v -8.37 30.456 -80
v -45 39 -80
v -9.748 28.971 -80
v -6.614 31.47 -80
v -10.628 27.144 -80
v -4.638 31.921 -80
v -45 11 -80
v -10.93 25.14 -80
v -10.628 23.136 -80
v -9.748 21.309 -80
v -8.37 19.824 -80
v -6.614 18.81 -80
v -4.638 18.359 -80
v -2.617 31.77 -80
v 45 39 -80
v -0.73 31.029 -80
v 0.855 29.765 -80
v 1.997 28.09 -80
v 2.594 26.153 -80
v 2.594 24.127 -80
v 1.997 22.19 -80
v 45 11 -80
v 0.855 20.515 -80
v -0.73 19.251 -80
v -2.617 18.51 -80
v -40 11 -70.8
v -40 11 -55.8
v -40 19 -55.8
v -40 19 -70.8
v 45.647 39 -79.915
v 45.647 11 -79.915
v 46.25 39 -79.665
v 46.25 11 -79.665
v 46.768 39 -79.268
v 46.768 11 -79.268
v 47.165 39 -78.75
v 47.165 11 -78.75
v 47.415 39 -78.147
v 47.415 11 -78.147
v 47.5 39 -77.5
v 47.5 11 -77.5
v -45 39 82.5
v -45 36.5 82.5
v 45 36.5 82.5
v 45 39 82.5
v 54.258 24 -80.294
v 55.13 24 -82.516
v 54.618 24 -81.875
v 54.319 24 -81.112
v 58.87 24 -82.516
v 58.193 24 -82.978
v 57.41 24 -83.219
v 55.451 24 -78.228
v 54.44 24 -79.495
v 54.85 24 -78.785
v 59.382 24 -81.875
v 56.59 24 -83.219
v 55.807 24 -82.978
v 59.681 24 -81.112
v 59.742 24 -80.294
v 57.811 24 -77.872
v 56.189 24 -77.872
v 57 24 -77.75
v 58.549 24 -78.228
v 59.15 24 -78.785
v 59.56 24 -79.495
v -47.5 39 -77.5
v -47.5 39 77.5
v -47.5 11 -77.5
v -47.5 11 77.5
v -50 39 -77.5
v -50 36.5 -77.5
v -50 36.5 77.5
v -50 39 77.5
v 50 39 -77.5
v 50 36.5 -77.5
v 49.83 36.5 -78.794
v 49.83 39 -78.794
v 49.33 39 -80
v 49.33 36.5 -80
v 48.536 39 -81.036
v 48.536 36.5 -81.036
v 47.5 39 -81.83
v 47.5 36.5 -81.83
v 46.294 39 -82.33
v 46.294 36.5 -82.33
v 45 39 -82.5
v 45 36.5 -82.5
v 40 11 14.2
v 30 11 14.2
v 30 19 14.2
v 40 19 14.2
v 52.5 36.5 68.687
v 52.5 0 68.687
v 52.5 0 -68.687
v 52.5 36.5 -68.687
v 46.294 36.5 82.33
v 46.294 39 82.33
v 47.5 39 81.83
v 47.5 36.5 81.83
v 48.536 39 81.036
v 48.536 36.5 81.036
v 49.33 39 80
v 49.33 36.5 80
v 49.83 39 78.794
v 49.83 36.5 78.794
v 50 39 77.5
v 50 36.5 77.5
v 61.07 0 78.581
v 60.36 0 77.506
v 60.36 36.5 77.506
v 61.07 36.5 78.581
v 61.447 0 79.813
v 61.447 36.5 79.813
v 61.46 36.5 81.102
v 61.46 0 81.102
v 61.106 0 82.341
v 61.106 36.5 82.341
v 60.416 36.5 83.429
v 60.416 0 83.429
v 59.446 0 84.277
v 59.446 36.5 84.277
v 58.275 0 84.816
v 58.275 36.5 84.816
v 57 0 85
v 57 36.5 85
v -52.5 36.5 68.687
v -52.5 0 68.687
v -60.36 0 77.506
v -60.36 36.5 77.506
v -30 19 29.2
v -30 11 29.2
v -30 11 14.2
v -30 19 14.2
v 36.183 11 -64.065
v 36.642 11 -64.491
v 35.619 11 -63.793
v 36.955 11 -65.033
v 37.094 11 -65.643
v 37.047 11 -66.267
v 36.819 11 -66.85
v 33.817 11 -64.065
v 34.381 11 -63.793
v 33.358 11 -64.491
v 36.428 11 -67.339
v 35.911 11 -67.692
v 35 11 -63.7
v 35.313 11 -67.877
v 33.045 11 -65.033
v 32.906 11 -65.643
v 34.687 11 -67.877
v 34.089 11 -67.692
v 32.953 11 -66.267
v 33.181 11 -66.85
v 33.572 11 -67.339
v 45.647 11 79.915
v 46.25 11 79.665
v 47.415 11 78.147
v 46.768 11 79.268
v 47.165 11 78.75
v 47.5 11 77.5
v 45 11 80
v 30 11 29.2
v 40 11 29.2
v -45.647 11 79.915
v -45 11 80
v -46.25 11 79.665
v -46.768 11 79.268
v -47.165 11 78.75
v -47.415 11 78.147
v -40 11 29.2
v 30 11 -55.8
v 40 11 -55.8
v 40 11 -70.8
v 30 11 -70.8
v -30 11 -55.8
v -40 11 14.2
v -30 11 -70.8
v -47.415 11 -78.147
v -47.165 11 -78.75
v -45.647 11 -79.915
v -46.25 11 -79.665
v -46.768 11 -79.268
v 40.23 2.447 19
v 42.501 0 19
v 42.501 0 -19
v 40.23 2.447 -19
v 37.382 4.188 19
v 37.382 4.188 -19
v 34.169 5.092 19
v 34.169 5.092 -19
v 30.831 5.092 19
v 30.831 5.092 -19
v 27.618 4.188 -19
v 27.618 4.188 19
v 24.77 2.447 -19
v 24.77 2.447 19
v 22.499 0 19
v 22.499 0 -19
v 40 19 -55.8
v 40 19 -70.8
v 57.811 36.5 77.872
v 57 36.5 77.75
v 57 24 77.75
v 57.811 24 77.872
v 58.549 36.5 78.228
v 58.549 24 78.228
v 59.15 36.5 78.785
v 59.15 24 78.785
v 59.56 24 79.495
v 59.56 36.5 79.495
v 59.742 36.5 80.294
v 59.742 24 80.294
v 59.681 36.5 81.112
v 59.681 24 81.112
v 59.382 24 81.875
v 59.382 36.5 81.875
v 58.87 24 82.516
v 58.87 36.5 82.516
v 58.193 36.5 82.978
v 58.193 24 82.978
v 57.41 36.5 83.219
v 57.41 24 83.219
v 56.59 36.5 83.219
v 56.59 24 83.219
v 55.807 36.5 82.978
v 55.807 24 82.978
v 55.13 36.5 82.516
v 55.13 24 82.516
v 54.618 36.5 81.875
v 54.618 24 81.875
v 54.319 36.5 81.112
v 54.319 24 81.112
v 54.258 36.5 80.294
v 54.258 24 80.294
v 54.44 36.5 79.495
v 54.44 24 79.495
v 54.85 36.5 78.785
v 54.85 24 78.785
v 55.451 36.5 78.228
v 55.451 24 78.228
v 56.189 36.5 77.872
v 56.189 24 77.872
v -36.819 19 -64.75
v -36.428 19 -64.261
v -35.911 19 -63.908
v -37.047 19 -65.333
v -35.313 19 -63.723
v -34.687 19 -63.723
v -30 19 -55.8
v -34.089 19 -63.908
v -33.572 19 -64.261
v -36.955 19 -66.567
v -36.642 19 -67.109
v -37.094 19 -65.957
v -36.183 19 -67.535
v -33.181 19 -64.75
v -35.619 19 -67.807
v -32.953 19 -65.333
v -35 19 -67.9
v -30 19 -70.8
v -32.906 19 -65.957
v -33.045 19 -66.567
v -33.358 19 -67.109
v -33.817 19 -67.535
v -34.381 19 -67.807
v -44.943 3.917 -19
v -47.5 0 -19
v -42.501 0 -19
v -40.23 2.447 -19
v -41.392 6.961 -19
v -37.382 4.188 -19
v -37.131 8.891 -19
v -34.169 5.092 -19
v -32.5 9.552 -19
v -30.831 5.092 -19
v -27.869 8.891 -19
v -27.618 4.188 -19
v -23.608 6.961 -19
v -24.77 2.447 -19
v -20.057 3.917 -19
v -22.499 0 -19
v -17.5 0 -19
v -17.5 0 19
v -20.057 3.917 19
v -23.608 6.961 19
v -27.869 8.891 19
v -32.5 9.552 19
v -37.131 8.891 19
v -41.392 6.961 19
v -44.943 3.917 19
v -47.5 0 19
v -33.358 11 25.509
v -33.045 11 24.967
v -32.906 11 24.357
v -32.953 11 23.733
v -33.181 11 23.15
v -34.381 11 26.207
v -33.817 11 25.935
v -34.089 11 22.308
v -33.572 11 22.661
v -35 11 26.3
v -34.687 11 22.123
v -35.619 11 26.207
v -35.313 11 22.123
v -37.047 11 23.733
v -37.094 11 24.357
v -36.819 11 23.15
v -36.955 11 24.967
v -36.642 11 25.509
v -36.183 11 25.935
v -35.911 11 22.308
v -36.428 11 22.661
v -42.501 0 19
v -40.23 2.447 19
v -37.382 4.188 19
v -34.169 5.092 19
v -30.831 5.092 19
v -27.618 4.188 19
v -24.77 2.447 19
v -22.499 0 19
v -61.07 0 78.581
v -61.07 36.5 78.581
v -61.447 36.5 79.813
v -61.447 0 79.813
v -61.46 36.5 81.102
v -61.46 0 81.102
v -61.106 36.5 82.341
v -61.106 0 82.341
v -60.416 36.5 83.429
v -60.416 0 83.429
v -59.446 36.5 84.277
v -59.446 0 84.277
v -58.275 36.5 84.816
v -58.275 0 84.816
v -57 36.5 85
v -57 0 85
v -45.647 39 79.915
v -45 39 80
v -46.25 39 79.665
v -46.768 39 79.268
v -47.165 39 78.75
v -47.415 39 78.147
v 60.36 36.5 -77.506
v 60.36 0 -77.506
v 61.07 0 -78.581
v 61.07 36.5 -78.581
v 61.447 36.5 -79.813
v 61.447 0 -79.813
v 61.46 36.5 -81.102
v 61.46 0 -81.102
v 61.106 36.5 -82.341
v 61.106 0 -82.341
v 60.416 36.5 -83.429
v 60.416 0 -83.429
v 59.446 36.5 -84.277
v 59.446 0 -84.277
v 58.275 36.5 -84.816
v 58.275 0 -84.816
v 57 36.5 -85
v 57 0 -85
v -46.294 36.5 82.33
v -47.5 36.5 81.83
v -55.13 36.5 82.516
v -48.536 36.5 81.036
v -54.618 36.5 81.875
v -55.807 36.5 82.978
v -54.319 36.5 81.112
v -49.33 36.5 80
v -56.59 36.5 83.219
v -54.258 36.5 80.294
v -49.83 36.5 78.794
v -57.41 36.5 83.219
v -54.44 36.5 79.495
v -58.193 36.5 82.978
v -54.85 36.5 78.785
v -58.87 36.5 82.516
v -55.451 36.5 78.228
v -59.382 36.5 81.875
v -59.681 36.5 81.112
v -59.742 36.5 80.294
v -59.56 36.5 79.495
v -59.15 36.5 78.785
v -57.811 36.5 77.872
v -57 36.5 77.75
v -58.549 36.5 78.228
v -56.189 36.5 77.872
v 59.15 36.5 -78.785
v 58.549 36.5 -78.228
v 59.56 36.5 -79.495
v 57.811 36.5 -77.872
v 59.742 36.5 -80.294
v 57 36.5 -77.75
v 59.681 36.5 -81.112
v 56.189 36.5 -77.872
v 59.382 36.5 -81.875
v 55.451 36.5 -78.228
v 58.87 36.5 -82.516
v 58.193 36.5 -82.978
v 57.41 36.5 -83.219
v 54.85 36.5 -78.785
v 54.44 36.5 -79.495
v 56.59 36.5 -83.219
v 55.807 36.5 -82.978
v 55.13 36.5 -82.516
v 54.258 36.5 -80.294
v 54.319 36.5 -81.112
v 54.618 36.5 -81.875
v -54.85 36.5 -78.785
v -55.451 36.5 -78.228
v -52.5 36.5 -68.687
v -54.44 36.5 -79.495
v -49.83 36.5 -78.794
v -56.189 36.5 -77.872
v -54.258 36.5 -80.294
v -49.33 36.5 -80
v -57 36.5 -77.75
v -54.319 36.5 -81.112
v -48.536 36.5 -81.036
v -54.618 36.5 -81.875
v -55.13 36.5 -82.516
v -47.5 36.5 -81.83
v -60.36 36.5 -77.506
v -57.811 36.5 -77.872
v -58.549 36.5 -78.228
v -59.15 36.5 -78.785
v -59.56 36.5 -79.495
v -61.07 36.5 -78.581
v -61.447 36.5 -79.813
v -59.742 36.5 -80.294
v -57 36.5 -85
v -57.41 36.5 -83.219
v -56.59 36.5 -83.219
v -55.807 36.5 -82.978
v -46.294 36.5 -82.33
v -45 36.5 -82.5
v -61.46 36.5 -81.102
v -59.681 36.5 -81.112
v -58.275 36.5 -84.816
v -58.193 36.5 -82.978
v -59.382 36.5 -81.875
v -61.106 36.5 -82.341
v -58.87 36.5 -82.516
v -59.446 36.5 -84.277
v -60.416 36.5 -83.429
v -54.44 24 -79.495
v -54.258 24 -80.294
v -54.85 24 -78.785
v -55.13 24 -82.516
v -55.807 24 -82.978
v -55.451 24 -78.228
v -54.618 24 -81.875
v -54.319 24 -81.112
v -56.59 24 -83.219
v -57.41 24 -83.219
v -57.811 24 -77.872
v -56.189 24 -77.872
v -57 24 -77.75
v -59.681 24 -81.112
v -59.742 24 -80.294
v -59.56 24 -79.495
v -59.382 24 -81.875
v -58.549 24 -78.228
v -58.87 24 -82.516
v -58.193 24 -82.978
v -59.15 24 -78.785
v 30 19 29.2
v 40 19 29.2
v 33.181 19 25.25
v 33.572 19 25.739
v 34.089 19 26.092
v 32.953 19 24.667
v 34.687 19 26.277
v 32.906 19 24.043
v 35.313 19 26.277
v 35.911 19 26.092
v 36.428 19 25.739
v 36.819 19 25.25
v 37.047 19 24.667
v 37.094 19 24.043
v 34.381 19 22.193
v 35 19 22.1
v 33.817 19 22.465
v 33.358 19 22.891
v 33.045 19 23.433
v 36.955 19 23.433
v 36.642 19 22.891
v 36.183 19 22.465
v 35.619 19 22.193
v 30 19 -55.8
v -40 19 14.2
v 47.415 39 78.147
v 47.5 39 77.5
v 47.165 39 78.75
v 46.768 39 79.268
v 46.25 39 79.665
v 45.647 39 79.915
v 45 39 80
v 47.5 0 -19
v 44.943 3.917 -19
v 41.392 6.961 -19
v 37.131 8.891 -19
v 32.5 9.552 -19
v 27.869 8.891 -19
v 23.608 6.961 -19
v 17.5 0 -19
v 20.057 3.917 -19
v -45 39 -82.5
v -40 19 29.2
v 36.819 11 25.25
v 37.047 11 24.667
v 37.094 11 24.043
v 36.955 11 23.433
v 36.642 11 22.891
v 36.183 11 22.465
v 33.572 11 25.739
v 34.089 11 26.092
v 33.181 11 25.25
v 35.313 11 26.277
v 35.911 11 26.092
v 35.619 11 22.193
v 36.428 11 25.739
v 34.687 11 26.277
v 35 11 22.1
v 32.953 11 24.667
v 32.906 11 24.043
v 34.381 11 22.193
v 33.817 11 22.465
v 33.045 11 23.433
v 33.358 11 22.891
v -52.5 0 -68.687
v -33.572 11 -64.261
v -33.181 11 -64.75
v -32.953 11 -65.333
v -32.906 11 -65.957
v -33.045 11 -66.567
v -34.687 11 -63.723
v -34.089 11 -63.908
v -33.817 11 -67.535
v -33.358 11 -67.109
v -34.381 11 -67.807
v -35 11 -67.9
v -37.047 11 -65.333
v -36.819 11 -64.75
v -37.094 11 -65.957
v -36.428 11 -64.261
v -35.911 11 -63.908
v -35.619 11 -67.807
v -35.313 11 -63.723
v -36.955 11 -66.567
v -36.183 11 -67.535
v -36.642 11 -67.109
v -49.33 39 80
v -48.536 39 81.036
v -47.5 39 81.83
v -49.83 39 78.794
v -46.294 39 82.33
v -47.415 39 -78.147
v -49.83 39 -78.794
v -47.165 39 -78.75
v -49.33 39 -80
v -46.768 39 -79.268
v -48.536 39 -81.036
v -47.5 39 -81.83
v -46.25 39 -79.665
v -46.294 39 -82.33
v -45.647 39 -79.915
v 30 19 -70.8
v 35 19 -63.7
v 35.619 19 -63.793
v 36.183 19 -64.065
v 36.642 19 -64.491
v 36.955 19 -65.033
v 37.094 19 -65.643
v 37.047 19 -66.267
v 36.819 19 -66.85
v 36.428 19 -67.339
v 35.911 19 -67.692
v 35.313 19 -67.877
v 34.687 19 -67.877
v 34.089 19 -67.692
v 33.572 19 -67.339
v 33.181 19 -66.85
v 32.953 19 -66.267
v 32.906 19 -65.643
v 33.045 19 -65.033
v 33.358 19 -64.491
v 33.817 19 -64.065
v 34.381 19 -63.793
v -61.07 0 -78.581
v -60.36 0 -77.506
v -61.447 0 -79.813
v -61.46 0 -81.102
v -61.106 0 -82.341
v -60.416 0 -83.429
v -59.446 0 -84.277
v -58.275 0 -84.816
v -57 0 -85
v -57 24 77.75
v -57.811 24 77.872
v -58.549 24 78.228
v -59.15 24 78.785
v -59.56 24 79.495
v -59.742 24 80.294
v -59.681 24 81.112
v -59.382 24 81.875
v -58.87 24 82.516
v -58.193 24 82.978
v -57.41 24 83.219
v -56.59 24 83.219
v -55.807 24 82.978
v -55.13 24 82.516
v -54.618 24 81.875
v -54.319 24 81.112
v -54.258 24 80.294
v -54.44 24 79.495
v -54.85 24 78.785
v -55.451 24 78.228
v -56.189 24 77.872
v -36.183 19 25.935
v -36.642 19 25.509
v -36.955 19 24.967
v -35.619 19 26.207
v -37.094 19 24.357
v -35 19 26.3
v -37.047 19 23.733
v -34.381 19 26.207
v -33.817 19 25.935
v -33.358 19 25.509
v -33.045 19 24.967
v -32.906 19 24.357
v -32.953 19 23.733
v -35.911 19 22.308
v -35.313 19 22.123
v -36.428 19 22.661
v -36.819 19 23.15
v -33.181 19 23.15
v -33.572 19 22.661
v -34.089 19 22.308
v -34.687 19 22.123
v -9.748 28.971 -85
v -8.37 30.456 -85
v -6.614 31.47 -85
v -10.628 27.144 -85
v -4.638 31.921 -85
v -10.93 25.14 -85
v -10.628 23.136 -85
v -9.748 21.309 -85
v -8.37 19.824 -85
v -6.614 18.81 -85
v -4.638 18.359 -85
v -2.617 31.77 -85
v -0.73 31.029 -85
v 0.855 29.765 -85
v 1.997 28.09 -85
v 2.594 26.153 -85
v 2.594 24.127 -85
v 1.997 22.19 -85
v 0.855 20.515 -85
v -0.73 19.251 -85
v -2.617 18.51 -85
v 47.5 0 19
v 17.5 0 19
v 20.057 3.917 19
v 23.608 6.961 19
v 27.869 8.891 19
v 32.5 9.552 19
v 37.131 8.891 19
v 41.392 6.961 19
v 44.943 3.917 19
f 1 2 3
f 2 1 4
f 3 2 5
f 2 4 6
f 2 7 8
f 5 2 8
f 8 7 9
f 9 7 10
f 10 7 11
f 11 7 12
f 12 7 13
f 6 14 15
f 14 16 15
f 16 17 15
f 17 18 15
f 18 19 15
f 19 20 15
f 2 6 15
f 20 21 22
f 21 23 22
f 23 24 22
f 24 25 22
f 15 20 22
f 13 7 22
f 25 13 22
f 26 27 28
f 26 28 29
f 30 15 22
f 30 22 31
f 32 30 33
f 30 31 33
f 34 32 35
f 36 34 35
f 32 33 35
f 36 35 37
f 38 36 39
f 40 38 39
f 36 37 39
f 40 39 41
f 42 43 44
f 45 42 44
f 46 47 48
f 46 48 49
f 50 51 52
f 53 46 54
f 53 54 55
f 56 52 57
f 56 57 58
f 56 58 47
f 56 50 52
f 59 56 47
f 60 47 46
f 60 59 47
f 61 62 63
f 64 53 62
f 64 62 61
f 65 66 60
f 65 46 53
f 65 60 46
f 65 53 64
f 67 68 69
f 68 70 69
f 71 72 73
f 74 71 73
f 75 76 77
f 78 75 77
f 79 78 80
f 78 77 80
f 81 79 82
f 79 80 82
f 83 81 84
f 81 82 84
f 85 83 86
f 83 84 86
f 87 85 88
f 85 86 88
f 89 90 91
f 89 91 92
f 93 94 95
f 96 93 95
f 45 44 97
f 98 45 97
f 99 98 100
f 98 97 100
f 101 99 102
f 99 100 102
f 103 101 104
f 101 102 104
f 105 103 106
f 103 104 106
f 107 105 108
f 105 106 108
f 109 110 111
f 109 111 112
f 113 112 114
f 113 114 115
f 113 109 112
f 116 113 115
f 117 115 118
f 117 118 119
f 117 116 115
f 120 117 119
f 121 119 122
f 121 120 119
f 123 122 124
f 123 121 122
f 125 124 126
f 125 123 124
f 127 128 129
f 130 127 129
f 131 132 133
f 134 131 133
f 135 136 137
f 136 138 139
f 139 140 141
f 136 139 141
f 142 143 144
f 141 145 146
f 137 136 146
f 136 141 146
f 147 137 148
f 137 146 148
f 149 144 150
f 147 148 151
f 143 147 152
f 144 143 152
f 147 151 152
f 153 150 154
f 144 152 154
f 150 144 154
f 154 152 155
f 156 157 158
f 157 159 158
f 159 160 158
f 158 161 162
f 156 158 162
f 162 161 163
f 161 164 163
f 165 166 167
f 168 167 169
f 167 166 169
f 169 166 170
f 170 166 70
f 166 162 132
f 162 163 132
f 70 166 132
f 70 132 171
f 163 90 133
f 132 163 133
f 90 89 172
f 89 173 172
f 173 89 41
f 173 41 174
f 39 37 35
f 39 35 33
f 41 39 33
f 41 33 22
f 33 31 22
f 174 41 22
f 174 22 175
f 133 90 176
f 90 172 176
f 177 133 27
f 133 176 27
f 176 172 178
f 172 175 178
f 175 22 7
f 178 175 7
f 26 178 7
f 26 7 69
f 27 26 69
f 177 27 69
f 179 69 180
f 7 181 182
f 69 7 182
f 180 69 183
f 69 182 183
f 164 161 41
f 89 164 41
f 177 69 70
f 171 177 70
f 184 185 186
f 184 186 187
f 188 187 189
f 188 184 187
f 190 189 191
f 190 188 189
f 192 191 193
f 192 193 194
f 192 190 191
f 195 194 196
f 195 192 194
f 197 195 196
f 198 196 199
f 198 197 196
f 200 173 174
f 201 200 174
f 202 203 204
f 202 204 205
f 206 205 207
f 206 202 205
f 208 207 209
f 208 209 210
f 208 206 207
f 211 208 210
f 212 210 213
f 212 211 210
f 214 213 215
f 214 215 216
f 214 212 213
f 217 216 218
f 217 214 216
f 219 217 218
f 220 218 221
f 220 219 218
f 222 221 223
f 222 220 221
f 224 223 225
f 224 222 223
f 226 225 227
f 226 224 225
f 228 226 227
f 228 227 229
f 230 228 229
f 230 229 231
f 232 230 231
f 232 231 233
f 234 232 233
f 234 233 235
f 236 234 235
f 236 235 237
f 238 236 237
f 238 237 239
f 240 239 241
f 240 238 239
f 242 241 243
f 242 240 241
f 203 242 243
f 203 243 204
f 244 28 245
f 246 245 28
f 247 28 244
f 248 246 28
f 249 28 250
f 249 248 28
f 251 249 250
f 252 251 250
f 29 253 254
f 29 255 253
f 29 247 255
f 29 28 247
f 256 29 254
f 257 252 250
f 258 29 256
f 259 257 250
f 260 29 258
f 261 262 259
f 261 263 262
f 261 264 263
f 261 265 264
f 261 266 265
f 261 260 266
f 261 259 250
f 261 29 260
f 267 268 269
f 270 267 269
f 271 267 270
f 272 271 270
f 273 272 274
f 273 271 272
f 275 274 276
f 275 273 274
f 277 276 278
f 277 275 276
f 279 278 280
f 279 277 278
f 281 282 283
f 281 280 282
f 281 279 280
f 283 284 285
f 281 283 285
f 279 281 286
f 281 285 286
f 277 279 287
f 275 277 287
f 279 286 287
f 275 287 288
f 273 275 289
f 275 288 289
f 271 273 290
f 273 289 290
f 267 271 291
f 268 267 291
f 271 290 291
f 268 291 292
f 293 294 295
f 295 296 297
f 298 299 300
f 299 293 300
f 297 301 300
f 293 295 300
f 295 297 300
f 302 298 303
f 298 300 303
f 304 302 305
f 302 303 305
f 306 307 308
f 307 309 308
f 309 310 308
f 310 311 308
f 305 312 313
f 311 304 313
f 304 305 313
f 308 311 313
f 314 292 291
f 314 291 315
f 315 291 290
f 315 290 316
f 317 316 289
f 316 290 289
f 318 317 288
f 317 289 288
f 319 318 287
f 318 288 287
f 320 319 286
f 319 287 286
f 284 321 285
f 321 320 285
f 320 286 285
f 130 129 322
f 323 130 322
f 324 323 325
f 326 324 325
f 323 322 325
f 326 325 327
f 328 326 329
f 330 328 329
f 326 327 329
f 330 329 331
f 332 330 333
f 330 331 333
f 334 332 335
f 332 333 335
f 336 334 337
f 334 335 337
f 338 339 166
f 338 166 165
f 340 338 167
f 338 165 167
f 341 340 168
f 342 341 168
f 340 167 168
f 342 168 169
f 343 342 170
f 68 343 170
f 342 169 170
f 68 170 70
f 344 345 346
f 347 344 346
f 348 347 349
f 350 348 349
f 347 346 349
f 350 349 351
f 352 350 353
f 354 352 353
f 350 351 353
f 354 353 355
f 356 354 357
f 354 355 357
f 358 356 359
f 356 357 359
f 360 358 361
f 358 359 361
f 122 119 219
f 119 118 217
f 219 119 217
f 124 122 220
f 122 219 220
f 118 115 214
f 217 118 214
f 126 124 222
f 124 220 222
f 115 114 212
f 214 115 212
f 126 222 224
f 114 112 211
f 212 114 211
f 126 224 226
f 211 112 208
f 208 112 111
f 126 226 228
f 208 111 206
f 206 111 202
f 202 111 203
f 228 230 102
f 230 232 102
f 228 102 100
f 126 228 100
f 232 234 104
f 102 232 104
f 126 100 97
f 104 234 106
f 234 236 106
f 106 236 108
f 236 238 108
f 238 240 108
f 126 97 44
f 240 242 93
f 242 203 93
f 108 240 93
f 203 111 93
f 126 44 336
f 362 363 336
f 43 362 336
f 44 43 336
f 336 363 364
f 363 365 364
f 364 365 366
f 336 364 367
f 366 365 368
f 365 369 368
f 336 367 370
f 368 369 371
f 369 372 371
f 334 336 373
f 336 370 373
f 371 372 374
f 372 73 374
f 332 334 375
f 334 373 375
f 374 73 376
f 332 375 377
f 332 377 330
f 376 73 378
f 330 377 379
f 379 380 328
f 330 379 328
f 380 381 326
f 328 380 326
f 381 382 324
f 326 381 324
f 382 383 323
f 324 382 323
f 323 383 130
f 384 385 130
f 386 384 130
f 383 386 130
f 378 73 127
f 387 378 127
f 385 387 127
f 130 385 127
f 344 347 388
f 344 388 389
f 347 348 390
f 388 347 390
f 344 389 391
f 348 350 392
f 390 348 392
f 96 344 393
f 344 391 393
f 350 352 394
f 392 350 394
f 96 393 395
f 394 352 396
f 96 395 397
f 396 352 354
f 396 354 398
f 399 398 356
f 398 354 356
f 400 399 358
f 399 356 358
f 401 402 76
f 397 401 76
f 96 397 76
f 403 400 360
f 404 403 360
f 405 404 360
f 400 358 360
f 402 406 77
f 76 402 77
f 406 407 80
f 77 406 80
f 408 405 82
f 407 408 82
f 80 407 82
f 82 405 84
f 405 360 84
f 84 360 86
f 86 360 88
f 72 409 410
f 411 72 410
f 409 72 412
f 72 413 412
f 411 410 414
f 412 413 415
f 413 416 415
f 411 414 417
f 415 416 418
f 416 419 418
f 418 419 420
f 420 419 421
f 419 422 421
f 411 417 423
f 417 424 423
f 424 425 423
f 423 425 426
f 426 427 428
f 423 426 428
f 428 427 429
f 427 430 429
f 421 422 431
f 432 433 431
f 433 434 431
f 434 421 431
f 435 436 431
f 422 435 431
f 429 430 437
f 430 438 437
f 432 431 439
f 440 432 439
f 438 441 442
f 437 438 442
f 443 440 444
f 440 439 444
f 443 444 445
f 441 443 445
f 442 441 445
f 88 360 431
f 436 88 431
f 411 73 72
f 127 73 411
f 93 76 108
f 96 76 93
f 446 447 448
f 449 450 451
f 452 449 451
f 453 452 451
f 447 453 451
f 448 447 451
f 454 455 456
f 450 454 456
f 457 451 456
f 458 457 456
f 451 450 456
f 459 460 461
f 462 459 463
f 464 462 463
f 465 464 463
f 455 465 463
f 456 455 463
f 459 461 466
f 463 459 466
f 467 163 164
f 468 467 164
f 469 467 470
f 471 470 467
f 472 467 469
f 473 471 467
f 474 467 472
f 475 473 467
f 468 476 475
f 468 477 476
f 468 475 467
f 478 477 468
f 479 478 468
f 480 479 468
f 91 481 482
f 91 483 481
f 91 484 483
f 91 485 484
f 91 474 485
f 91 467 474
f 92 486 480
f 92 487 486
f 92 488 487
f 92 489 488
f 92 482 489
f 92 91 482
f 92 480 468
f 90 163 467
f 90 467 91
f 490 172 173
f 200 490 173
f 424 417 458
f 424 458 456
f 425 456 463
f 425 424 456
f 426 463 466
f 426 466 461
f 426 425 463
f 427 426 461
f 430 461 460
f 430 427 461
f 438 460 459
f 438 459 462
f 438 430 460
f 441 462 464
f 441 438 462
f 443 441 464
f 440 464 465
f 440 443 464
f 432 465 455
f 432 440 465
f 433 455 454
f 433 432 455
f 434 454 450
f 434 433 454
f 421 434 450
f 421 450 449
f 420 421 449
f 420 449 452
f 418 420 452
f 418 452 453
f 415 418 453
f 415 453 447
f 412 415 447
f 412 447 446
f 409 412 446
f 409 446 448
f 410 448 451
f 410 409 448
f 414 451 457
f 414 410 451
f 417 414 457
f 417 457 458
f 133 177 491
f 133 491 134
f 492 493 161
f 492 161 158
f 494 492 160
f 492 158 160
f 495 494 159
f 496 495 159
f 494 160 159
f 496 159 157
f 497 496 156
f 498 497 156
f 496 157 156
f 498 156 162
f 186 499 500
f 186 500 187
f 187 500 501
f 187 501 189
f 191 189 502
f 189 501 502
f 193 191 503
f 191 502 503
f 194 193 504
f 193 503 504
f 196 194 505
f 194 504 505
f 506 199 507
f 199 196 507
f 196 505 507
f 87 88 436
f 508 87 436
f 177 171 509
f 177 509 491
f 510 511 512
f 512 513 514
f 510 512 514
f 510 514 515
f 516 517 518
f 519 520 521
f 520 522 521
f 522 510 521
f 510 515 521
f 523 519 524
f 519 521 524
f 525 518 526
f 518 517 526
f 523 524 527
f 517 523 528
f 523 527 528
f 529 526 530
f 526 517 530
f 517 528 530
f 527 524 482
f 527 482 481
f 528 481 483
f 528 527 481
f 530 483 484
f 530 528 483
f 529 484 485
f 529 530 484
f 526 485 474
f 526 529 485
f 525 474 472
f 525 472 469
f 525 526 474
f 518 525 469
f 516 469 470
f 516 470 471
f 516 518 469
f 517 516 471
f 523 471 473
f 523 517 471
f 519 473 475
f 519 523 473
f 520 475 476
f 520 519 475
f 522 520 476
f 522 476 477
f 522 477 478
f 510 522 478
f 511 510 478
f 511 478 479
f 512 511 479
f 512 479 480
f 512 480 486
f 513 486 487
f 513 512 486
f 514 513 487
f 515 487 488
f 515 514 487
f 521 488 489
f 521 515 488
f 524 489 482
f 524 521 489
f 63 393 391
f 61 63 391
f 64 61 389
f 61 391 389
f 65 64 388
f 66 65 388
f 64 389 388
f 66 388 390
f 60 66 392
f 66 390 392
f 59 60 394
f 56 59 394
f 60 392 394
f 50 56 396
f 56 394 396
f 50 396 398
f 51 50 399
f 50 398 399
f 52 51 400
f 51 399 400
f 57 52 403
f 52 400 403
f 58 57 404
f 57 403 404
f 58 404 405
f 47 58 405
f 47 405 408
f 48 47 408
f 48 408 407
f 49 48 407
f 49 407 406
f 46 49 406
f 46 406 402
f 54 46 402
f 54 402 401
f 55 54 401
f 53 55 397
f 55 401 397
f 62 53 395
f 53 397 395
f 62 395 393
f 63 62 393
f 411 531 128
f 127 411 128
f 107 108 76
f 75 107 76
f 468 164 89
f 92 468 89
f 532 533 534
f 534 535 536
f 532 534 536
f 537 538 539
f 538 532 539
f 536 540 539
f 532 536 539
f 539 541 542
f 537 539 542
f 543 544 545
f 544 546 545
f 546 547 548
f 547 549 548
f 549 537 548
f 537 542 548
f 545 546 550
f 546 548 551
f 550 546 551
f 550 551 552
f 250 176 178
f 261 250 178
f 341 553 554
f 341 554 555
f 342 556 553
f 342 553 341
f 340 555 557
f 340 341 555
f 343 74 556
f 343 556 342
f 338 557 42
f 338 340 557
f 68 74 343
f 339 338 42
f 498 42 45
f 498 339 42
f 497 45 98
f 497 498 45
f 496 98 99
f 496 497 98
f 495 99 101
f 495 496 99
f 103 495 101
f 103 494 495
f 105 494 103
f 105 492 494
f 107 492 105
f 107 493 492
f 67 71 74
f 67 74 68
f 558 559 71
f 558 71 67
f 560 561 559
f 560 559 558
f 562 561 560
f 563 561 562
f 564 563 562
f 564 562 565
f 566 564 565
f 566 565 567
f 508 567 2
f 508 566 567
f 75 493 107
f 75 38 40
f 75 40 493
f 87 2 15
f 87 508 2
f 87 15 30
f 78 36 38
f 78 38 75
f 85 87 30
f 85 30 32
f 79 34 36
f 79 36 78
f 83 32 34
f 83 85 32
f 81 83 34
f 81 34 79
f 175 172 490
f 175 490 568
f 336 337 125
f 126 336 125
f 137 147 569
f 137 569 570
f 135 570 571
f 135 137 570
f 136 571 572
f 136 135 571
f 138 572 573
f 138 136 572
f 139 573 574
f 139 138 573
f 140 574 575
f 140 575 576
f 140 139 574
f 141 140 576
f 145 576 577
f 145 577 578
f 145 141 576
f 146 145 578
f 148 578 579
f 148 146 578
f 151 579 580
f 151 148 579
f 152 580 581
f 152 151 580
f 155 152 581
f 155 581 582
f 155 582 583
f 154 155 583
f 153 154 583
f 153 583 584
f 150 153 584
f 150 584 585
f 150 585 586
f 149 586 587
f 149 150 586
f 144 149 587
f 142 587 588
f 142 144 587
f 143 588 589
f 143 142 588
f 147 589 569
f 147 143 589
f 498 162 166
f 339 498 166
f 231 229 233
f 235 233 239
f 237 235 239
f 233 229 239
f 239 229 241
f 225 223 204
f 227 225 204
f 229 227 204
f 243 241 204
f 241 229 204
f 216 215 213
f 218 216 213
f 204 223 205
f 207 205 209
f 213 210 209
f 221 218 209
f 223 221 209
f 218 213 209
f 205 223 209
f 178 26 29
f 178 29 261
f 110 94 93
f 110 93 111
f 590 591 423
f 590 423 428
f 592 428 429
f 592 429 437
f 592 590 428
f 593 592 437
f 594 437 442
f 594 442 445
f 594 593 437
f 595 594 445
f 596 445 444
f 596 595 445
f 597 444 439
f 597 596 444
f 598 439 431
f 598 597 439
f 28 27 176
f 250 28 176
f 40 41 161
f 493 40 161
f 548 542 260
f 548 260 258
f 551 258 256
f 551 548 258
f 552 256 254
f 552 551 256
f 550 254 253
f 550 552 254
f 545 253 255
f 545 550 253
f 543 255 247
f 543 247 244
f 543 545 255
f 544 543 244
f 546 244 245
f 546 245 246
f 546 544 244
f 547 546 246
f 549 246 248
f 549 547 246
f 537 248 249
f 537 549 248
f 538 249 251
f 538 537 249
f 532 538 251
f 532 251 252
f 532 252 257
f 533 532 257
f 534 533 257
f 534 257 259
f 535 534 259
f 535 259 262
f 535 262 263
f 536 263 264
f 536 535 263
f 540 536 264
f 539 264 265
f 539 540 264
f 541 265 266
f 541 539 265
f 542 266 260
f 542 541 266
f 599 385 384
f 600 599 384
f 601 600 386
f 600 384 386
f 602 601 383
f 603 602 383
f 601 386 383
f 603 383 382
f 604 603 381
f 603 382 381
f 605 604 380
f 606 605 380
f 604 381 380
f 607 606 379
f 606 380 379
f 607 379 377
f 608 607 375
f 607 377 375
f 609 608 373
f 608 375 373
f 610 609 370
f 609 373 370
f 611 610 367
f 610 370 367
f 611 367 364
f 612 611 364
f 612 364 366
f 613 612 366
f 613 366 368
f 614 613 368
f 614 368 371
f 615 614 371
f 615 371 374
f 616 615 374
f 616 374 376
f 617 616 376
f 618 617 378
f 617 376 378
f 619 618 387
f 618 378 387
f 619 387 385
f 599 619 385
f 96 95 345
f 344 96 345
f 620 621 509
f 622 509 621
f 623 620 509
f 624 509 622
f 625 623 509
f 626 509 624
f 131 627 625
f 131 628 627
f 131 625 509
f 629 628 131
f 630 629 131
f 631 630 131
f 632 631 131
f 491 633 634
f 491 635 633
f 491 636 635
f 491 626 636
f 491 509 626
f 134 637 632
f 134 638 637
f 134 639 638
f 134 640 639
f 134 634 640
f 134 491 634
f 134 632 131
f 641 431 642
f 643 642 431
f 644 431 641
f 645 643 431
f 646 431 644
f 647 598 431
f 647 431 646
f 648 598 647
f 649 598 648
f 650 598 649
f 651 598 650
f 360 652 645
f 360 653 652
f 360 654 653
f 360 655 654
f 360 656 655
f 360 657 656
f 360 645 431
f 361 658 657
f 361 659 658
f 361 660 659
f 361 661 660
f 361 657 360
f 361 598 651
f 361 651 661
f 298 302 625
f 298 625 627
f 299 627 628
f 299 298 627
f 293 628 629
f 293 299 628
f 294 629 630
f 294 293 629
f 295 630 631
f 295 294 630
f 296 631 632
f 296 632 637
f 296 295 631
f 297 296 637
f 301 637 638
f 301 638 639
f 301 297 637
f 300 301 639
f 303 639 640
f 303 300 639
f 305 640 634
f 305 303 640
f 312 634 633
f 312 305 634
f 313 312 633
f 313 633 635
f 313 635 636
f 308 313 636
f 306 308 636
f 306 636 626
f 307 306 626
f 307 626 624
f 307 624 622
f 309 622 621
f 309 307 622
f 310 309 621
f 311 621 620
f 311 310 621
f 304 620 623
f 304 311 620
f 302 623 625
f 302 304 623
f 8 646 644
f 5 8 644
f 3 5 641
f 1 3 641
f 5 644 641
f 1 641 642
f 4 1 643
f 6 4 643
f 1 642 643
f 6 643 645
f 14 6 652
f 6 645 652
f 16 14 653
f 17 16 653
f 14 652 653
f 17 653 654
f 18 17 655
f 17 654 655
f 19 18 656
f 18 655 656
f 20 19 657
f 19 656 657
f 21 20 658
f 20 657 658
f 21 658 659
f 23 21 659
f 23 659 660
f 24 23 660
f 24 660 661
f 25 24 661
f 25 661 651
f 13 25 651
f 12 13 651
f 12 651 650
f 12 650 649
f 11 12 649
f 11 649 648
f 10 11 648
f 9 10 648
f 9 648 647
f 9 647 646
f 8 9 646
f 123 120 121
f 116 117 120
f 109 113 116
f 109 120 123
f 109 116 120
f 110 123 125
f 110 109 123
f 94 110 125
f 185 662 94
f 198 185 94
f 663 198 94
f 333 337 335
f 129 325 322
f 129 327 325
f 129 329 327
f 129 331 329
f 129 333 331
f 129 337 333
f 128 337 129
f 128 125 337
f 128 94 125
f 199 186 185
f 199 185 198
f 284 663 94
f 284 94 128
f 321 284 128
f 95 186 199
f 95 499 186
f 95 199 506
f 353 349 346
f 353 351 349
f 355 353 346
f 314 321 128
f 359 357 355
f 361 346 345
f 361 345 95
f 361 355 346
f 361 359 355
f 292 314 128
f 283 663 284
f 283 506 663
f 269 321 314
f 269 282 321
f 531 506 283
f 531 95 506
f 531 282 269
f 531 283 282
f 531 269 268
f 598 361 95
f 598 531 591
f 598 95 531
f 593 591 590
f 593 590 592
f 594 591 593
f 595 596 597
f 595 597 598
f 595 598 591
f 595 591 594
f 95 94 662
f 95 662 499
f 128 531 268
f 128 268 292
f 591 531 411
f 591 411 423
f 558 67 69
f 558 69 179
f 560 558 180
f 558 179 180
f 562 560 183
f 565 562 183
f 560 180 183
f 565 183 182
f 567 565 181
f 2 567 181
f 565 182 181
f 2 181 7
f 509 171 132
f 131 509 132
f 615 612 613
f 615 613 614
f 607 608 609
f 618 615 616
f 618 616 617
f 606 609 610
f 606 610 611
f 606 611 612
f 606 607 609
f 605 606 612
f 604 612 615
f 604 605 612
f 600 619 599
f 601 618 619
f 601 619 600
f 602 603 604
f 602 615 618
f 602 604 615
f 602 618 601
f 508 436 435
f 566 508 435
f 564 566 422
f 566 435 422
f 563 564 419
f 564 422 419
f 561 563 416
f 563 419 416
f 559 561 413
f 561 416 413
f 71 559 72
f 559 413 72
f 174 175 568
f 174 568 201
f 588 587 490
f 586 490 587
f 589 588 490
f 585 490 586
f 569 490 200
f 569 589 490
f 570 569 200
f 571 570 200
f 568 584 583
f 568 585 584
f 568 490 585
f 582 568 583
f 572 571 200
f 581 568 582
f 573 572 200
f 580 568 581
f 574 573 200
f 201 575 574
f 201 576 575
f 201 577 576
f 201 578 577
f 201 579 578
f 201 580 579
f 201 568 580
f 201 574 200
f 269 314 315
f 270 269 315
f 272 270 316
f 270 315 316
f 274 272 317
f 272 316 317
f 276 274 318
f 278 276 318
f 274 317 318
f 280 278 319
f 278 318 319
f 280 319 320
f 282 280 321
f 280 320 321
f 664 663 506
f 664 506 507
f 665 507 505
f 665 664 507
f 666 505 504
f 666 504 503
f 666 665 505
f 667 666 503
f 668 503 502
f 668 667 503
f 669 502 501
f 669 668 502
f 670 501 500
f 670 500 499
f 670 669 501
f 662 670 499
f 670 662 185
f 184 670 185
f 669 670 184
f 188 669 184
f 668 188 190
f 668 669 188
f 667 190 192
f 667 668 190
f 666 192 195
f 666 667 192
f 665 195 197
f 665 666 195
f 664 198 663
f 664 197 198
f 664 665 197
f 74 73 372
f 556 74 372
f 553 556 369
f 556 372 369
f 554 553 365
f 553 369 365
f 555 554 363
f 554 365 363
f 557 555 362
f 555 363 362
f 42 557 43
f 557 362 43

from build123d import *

# Parameters (mm, degrees)
SALIENTE_EXTRUIR2_DEPTH   = 11
SALIENTE_EXTRUIR3_DEPTH   = 25.5
SALIENTE_EXTRUIR4_DEPTH   = 2.5
SALIENTE_EXTRUIR5_DEPTH   = 36.5
SIMETR_A2_COPY_1_DEPTH    = 36.5
CROQUIS6_W                = 10
CROQUIS6_H                = 15
CROQUIS6_R                = 2.1
SALIENTE_EXTRUIR6_DEPTH   = 8
CROQUIS8_R                = 6.8
CORTAR_EXTRUIR2_DEPTH     = 8
CROQUIS9_R                = 6.5
CORTAR_EXTRUIR3_DEPTH     = 8
CORTAR_EXTRUIR4_DEPTH     = 38
CROQUIS13_R               = 2.75
CORTAR_EXTRUIR5_DEPTH     = 12.5
SIMETR_A7_COPY_1_SKETCH_R = 2.75
SIMETR_A7_COPY_1_DEPTH    = 12.5
CORTAR_EXTRUIR6_START     = -2.5
CROQUIS15_R               = 12.5
CROQUIS15_R_2             = 6.5
CORTAR_EXTRUIR6_DEPTH     = 2.5
CROQUIS16_R               = 13.413268366
SALIENTE_EXTRUIR7_DEPTH   = 5


with BuildPart() as part:
    # Croquis1 → Saliente-Extruir2 (new body)
    # profile 1 of 3: a face of its own
    with BuildSketch(Plane(origin=(0, 0, 0), x_dir=(1, 0, 0), z_dir=(0, 1, 0))):
        with BuildLine():
            Line((-45, 85), (45, 85))
            ThreePointArc((45, 85), (50.303300859, 82.803300859), (52.5, 77.5))
            Line((52.5, 77.5), (52.5, -77.5))
            ThreePointArc((52.5, -77.5), (50.303300859, -82.803300859), (45, -85))
            Line((45, -85), (-45, -85))
            ThreePointArc((-45, -85), (-50.303300859, -82.803300859), (-52.5, -77.5))
            Line((-52.5, -77.5), (-52.5, 77.5))
            ThreePointArc((-52.5, 77.5), (-50.303300859, 82.803300859), (-45, 85))
        make_face()
        with BuildLine():
            ThreePointArc((-45, 82.5), (-48.535533906, 81.035533906), (-50, 77.5))
            Line((-50, 77.5), (-50, -77.5))
            ThreePointArc((-50, -77.5), (-48.535533906, -81.035533906), (-45, -82.5))
            Line((-45, -82.5), (45, -82.5))
            ThreePointArc((45, -82.5), (48.535533906, -81.035533906), (50, -77.5))
            Line((50, -77.5), (50, 77.5))
            ThreePointArc((50, 77.5), (48.535533906, 81.035533906), (45, 82.5))
            Line((45, 82.5), (-45, 82.5))
        make_face(mode=Mode.SUBTRACT)
    # profile 2 of 3: a face of its own
    with BuildSketch(Plane(origin=(0, 0, 0), x_dir=(1, 0, 0), z_dir=(0, 1, 0))):
        with BuildLine():
            Line((-45, 82.5), (45, 82.5))
            ThreePointArc((45, 82.5), (48.535533906, 81.035533906), (50, 77.5))
            Line((50, 77.5), (50, -77.5))
            ThreePointArc((50, -77.5), (48.535533906, -81.035533906), (45, -82.5))
            Line((45, -82.5), (-45, -82.5))
            ThreePointArc((-45, -82.5), (-48.535533906, -81.035533906), (-50, -77.5))
            Line((-50, -77.5), (-50, 77.5))
            ThreePointArc((-50, 77.5), (-48.535533906, 81.035533906), (-45, 82.5))
        make_face()
        with BuildLine():
            ThreePointArc((45, -80), (46.767766953, -79.267766953), (47.5, -77.5))
            Line((47.5, -77.5), (47.5, 77.5))
            ThreePointArc((47.5, 77.5), (46.767766953, 79.267766953), (45, 80))
            Line((45, 80), (-45, 80))
            ThreePointArc((-45, 80), (-46.767766953, 79.267766953), (-47.5, 77.5))
            Line((-47.5, 77.5), (-47.5, -77.5))
            ThreePointArc((-47.5, -77.5), (-46.767766953, -79.267766953), (-45, -80))
            Line((-45, -80), (45, -80))
        make_face(mode=Mode.SUBTRACT)
    # profile 3 of 3: a face of its own
    with BuildSketch(Plane(origin=(0, 0, 0), x_dir=(1, 0, 0), z_dir=(0, 1, 0))):
        with BuildLine():
            Line((-45, -80), (45, -80))
            ThreePointArc((45, -80), (46.767766953, -79.267766953), (47.5, -77.5))
            Line((47.5, -77.5), (47.5, 77.5))
            ThreePointArc((47.5, 77.5), (46.767766953, 79.267766953), (45, 80))
            Line((45, 80), (-45, 80))
            ThreePointArc((-45, 80), (-46.767766953, 79.267766953), (-47.5, 77.5))
            Line((-47.5, 77.5), (-47.5, -77.5))
            ThreePointArc((-47.5, -77.5), (-46.767766953, -79.267766953), (-45, -80))
        make_face()
    extrude(amount=SALIENTE_EXTRUIR2_DEPTH)

    # Croquis2 → Saliente-Extruir3 (add)
    # profile 1 of 2: a face of its own
    with BuildSketch(Plane(origin=(0, 11, 0), x_dir=(1, 0, 0), z_dir=(0, 1, 0))):
        with BuildLine():
            ThreePointArc((52.5, 77.5), (50.303300859, 82.803300859), (45, 85))
            Line((45, 85), (-45, 85))
            ThreePointArc((-45, 85), (-50.303300859, 82.803300859), (-52.5, 77.5))
            Line((-52.5, 77.5), (-52.5, -77.5))
            ThreePointArc((-52.5, -77.5), (-50.303300859, -82.803300859), (-45, -85))
            Line((-45, -85), (45, -85))
            ThreePointArc((45, -85), (50.303300859, -82.803300859), (52.5, -77.5))
            Line((52.5, -77.5), (52.5, 77.5))
        make_face()
        with BuildLine():
            ThreePointArc((-45, 82.5), (-48.535533906, 81.035533906), (-50, 77.5))
            Line((-50, 77.5), (-50, -77.5))
            ThreePointArc((-50, -77.5), (-48.535533906, -81.035533906), (-45, -82.5))
            Line((-45, -82.5), (45, -82.5))
            ThreePointArc((45, -82.5), (48.535533906, -81.035533906), (50, -77.5))
            Line((50, -77.5), (50, 77.5))
            ThreePointArc((50, 77.5), (48.535533906, 81.035533906), (45, 82.5))
            Line((45, 82.5), (-45, 82.5))
        make_face(mode=Mode.SUBTRACT)
    # profile 2 of 2: a face of its own
    with BuildSketch(Plane(origin=(0, 11, 0), x_dir=(1, 0, 0), z_dir=(0, 1, 0))):
        with BuildLine():
            Line((45, 82.5), (-45, 82.5))
            ThreePointArc((-45, 82.5), (-48.535533906, 81.035533906), (-50, 77.5))
            Line((-50, 77.5), (-50, -77.5))
            ThreePointArc((-50, -77.5), (-48.535533906, -81.035533906), (-45, -82.5))
            Line((-45, -82.5), (45, -82.5))
            ThreePointArc((45, -82.5), (48.535533906, -81.035533906), (50, -77.5))
            Line((50, -77.5), (50, 77.5))
            ThreePointArc((50, 77.5), (48.535533906, 81.035533906), (45, 82.5))
        make_face()
        with BuildLine():
            ThreePointArc((-45, 80), (-46.767766953, 79.267766953), (-47.5, 77.5))
            Line((-47.5, 77.5), (-47.5, -77.5))
            ThreePointArc((-47.5, -77.5), (-46.767766953, -79.267766953), (-45, -80))
            Line((-45, -80), (45, -80))
            ThreePointArc((45, -80), (46.767766953, -79.267766953), (47.5, -77.5))
            Line((47.5, -77.5), (47.5, 77.5))
            ThreePointArc((47.5, 77.5), (46.767766953, 79.267766953), (45, 80))
            Line((45, 80), (-45, 80))
        make_face(mode=Mode.SUBTRACT)
    extrude(amount=SALIENTE_EXTRUIR3_DEPTH)

    # Croquis3 → Saliente-Extruir4 (add)
    with BuildSketch(Plane(origin=(0, 36.5, 0), x_dir=(1, 0, 0), z_dir=(0, 1, 0))):
        with BuildLine():
            Line((45, 82.5), (-45, 82.5))
            ThreePointArc((-45, 82.5), (-48.535533906, 81.035533906), (-50, 77.5))
            Line((-50, 77.5), (-50, -77.5))
            ThreePointArc((-50, -77.5), (-48.535533906, -81.035533906), (-45, -82.5))
            Line((-45, -82.5), (45, -82.5))
            ThreePointArc((45, -82.5), (48.535533906, -81.035533906), (50, -77.5))
            Line((50, -77.5), (50, 77.5))
            ThreePointArc((50, 77.5), (48.535533906, 81.035533906), (45, 82.5))
        make_face()
        with BuildLine():
            Line((-47.5, -77.5), (-47.5, 77.5))
            ThreePointArc((-47.5, 77.5), (-46.767766953, 79.267766953), (-45, 80))
            Line((-45, 80), (45, 80))
            ThreePointArc((45, 80), (46.767766953, 79.267766953), (47.5, 77.5))
            Line((47.5, 77.5), (47.5, -77.5))
            ThreePointArc((47.5, -77.5), (46.767766953, -79.267766953), (45, -80))
            Line((45, -80), (-45, -80))
            ThreePointArc((-45, -80), (-46.767766953, -79.267766953), (-47.5, -77.5))
        make_face(mode=Mode.SUBTRACT)
    extrude(amount=SALIENTE_EXTRUIR4_DEPTH)

    # Croquis4 → Saliente-Extruir5 (add)
    with BuildSketch(Plane.XZ):
        with BuildLine():
            Line((57, 85), (45, 85))
            ThreePointArc((45, 85), (50.303300859, 82.803300859), (52.5, 77.5))
            Line((52.5, 77.5), (52.5, 68.686877301))
            Line((52.5, 68.686877301), (60.359510947, 77.506058418))
            ThreePointArc((60.359510947, 77.506058418), (61.10625968, 82.340823577), (57, 85))
        make_face()
    saliente_extruir5 = extrude(amount=-SALIENTE_EXTRUIR5_DEPTH)

    # Simetría1: Saliente-Extruir5 across plane
    add(saliente_extruir5.mirror(Plane(origin=(0, 0, 0), x_dir=(0, 0, 1), z_dir=(1, 0, 0))))

    # Simetría2: Saliente-Extruir5 across plane
    add(saliente_extruir5.mirror(Plane.XY))

    # Simetría2 copy 1 sketch → Simetría2 copy 1 (add)
    with BuildSketch(Plane(origin=(0, 0, 0), x_dir=(-1, 0, 0), z_dir=(0, -1, 0))):
        with BuildLine():
            Line((57, 85), (45, 85))
            ThreePointArc((45, 85), (50.303300859, 82.803300859), (52.5, 77.5))
            Line((52.5, 77.5), (52.5, 68.686877301))
            Line((52.5, 68.686877301), (60.359510947, 77.506058418))
            ThreePointArc((60.359510947, 77.506058418), (61.10625968, 82.340823577), (57, 85))
        make_face()
    extrude(amount=-SIMETR_A2_COPY_1_DEPTH)

    # Croquis6 → Saliente-Extruir6 (add)
    # profile 1 of 4: a face of its own
    with BuildSketch(Plane(origin=(0, 11, 0), x_dir=(1, 0, 0), z_dir=(0, 1, 0))):
        with Locations((-35, 63.3)):
            Rectangle(CROQUIS6_W, CROQUIS6_H)
        with Locations(Location((-35, 65.8, 0), (0, 0, 90))):
            Circle(CROQUIS6_R, mode=Mode.SUBTRACT)
    # profile 2 of 4: a face of its own
    with BuildSketch(Plane(origin=(0, 11, 0), x_dir=(1, 0, 0), z_dir=(0, 1, 0))):
        with Locations((-35, -21.7)):
            Rectangle(CROQUIS6_W, CROQUIS6_H)
        with Locations(Location((-35, -24.2, 0), (0, 0, 270))):
            Circle(CROQUIS6_R, mode=Mode.SUBTRACT)
    # profile 3 of 4: a face of its own
    with BuildSketch(Plane(origin=(0, 11, 0), x_dir=(1, 0, 0), z_dir=(0, 1, 0))):
        with Locations((35, -21.7)):
            Rectangle(CROQUIS6_W, CROQUIS6_H)
        with Locations(Location((35, -24.2, 0), (0, 0, 90))):
            Circle(CROQUIS6_R, mode=Mode.SUBTRACT)
    # profile 4 of 4: a face of its own
    with BuildSketch(Plane(origin=(0, 11, 0), x_dir=(1, 0, 0), z_dir=(0, 1, 0))):
        with Locations((35, 63.3)):
            Rectangle(CROQUIS6_W, CROQUIS6_H)
        with Locations(Location((35, 65.8, 0), (0, 0, 270))):
            Circle(CROQUIS6_R, mode=Mode.SUBTRACT)
    extrude(amount=SALIENTE_EXTRUIR6_DEPTH)

    # Croquis8 → Cortar-Extruir2 (cut)
    with BuildSketch(Plane(origin=(0, 0, -85), x_dir=(-1, 0, 0), z_dir=(0, 0, -1))):
        with Locations((4.13, 25.14)):
            Circle(CROQUIS8_R)
    extrude(amount=-CORTAR_EXTRUIR2_DEPTH, mode=Mode.SUBTRACT)

    # Croquis9 → Cortar-Extruir3 (cut)
    with BuildSketch(Plane.ZY.offset(-47.5)):
        with Locations((0, 22)):
            Circle(CROQUIS9_R)
    extrude(amount=-CORTAR_EXTRUIR3_DEPTH, mode=Mode.SUBTRACT)

    # Croquis12 → Cortar-Extruir4 (cut)
    with BuildSketch(Plane.XY.offset(19)):
        with BuildLine():
            ThreePointArc((-17.5, 0), (-32.5, 9.552208488), (-47.5, 0))
            Line((-47.5, 0), (-42.537800124, 0))
            Line((-42.537800124, 0), (-42.500633869, 0))
            ThreePointArc((-42.500633869, 0), (-32.5, 5.20653028), (-22.499366131, 0))
            Line((-22.499366131, 0), (-17.5, 0))
        make_face()
        with BuildLine():
            Line((-42.537800124, 0), (-47.5, 0))
            ThreePointArc((-47.5, 0), (-36.085777282, -23.16172488), (-15.946514625, -7.001276887))
            ThreePointArc((-15.946514625, -7.001276887), (-16.339552007, -3.415499605), (-17.5, 0))
            Line((-17.5, 0), (-22.499366131, 0))
            ThreePointArc((-22.499366131, 0), (-20.857054375, -3.330803756), (-20.292192833, -7.001276887))
            ThreePointArc((-20.292192833, -7.001276887), (-36.170473131, -18.644222512), (-42.500633869, 0))
            Line((-42.500633869, 0), (-42.537800124, 0))
        make_face()
    cortar_extruir4 = extrude(amount=-CORTAR_EXTRUIR4_DEPTH, mode=Mode.SUBTRACT)

    # Simetría5: Cortar-Extruir4 across plane
    add(cortar_extruir4.mirror(Plane(origin=(0, 0, 0), x_dir=(0, 0, 1), z_dir=(1, 0, 0))), mode=Mode.SUBTRACT)

    # Croquis13 → Cortar-Extruir5 (cut)
    with BuildSketch(Plane(origin=(0, 36.5, 0), x_dir=(1, 0, 0), z_dir=(0, 1, 0))):
        with Locations(Location((57, 80.5, 0), (0, 0, 270))):
            Circle(CROQUIS13_R)
    cortar_extruir5 = extrude(amount=-CORTAR_EXTRUIR5_DEPTH, mode=Mode.SUBTRACT)

    # Simetría6: Cortar-Extruir5 across plane
    add(cortar_extruir5.mirror(Plane.XY), mode=Mode.SUBTRACT)

    # Simetría7: Cortar-Extruir5 across plane
    add(cortar_extruir5.mirror(Plane(origin=(0, 0, 0), x_dir=(0, 0, 1), z_dir=(1, 0, 0))), mode=Mode.SUBTRACT)

    # Simetría7 copy 1 sketch → Simetría7 copy 1 (cut)
    with BuildSketch(Plane(origin=(0, 36.5, 0), x_dir=(-1, 0, 0), z_dir=(0, 1, 0))):
        with Locations(Location((57, 80.5, 0), (0, 0, 270))):
            Circle(SIMETR_A7_COPY_1_SKETCH_R)
    extrude(amount=-SIMETR_A7_COPY_1_DEPTH, mode=Mode.SUBTRACT)

    # Croquis15 → Cortar-Extruir6 (cut)
    with BuildSketch(Plane(origin=(52.5, 0, 0), x_dir=(0, 0, -1), z_dir=(1, 0, 0)).offset(CORTAR_EXTRUIR6_START)):
        with Locations((0, 22)):
            Circle(CROQUIS15_R)
        with Locations(Location((0, 22, 0), (0, 0, 180))):
            Circle(CROQUIS15_R_2, mode=Mode.SUBTRACT)
    extrude(amount=CORTAR_EXTRUIR6_DEPTH, mode=Mode.SUBTRACT)

    # Croquis16 → Saliente-Extruir7 (add)
    with BuildSketch(Plane(origin=(52.5, 0, 0), x_dir=(0, 0, -1), z_dir=(1, 0, 0))):
        with Locations((0, 22)):
            Circle(CROQUIS16_R)
    extrude(amount=-SALIENTE_EXTRUIR7_DEPTH)


solid = part.part
